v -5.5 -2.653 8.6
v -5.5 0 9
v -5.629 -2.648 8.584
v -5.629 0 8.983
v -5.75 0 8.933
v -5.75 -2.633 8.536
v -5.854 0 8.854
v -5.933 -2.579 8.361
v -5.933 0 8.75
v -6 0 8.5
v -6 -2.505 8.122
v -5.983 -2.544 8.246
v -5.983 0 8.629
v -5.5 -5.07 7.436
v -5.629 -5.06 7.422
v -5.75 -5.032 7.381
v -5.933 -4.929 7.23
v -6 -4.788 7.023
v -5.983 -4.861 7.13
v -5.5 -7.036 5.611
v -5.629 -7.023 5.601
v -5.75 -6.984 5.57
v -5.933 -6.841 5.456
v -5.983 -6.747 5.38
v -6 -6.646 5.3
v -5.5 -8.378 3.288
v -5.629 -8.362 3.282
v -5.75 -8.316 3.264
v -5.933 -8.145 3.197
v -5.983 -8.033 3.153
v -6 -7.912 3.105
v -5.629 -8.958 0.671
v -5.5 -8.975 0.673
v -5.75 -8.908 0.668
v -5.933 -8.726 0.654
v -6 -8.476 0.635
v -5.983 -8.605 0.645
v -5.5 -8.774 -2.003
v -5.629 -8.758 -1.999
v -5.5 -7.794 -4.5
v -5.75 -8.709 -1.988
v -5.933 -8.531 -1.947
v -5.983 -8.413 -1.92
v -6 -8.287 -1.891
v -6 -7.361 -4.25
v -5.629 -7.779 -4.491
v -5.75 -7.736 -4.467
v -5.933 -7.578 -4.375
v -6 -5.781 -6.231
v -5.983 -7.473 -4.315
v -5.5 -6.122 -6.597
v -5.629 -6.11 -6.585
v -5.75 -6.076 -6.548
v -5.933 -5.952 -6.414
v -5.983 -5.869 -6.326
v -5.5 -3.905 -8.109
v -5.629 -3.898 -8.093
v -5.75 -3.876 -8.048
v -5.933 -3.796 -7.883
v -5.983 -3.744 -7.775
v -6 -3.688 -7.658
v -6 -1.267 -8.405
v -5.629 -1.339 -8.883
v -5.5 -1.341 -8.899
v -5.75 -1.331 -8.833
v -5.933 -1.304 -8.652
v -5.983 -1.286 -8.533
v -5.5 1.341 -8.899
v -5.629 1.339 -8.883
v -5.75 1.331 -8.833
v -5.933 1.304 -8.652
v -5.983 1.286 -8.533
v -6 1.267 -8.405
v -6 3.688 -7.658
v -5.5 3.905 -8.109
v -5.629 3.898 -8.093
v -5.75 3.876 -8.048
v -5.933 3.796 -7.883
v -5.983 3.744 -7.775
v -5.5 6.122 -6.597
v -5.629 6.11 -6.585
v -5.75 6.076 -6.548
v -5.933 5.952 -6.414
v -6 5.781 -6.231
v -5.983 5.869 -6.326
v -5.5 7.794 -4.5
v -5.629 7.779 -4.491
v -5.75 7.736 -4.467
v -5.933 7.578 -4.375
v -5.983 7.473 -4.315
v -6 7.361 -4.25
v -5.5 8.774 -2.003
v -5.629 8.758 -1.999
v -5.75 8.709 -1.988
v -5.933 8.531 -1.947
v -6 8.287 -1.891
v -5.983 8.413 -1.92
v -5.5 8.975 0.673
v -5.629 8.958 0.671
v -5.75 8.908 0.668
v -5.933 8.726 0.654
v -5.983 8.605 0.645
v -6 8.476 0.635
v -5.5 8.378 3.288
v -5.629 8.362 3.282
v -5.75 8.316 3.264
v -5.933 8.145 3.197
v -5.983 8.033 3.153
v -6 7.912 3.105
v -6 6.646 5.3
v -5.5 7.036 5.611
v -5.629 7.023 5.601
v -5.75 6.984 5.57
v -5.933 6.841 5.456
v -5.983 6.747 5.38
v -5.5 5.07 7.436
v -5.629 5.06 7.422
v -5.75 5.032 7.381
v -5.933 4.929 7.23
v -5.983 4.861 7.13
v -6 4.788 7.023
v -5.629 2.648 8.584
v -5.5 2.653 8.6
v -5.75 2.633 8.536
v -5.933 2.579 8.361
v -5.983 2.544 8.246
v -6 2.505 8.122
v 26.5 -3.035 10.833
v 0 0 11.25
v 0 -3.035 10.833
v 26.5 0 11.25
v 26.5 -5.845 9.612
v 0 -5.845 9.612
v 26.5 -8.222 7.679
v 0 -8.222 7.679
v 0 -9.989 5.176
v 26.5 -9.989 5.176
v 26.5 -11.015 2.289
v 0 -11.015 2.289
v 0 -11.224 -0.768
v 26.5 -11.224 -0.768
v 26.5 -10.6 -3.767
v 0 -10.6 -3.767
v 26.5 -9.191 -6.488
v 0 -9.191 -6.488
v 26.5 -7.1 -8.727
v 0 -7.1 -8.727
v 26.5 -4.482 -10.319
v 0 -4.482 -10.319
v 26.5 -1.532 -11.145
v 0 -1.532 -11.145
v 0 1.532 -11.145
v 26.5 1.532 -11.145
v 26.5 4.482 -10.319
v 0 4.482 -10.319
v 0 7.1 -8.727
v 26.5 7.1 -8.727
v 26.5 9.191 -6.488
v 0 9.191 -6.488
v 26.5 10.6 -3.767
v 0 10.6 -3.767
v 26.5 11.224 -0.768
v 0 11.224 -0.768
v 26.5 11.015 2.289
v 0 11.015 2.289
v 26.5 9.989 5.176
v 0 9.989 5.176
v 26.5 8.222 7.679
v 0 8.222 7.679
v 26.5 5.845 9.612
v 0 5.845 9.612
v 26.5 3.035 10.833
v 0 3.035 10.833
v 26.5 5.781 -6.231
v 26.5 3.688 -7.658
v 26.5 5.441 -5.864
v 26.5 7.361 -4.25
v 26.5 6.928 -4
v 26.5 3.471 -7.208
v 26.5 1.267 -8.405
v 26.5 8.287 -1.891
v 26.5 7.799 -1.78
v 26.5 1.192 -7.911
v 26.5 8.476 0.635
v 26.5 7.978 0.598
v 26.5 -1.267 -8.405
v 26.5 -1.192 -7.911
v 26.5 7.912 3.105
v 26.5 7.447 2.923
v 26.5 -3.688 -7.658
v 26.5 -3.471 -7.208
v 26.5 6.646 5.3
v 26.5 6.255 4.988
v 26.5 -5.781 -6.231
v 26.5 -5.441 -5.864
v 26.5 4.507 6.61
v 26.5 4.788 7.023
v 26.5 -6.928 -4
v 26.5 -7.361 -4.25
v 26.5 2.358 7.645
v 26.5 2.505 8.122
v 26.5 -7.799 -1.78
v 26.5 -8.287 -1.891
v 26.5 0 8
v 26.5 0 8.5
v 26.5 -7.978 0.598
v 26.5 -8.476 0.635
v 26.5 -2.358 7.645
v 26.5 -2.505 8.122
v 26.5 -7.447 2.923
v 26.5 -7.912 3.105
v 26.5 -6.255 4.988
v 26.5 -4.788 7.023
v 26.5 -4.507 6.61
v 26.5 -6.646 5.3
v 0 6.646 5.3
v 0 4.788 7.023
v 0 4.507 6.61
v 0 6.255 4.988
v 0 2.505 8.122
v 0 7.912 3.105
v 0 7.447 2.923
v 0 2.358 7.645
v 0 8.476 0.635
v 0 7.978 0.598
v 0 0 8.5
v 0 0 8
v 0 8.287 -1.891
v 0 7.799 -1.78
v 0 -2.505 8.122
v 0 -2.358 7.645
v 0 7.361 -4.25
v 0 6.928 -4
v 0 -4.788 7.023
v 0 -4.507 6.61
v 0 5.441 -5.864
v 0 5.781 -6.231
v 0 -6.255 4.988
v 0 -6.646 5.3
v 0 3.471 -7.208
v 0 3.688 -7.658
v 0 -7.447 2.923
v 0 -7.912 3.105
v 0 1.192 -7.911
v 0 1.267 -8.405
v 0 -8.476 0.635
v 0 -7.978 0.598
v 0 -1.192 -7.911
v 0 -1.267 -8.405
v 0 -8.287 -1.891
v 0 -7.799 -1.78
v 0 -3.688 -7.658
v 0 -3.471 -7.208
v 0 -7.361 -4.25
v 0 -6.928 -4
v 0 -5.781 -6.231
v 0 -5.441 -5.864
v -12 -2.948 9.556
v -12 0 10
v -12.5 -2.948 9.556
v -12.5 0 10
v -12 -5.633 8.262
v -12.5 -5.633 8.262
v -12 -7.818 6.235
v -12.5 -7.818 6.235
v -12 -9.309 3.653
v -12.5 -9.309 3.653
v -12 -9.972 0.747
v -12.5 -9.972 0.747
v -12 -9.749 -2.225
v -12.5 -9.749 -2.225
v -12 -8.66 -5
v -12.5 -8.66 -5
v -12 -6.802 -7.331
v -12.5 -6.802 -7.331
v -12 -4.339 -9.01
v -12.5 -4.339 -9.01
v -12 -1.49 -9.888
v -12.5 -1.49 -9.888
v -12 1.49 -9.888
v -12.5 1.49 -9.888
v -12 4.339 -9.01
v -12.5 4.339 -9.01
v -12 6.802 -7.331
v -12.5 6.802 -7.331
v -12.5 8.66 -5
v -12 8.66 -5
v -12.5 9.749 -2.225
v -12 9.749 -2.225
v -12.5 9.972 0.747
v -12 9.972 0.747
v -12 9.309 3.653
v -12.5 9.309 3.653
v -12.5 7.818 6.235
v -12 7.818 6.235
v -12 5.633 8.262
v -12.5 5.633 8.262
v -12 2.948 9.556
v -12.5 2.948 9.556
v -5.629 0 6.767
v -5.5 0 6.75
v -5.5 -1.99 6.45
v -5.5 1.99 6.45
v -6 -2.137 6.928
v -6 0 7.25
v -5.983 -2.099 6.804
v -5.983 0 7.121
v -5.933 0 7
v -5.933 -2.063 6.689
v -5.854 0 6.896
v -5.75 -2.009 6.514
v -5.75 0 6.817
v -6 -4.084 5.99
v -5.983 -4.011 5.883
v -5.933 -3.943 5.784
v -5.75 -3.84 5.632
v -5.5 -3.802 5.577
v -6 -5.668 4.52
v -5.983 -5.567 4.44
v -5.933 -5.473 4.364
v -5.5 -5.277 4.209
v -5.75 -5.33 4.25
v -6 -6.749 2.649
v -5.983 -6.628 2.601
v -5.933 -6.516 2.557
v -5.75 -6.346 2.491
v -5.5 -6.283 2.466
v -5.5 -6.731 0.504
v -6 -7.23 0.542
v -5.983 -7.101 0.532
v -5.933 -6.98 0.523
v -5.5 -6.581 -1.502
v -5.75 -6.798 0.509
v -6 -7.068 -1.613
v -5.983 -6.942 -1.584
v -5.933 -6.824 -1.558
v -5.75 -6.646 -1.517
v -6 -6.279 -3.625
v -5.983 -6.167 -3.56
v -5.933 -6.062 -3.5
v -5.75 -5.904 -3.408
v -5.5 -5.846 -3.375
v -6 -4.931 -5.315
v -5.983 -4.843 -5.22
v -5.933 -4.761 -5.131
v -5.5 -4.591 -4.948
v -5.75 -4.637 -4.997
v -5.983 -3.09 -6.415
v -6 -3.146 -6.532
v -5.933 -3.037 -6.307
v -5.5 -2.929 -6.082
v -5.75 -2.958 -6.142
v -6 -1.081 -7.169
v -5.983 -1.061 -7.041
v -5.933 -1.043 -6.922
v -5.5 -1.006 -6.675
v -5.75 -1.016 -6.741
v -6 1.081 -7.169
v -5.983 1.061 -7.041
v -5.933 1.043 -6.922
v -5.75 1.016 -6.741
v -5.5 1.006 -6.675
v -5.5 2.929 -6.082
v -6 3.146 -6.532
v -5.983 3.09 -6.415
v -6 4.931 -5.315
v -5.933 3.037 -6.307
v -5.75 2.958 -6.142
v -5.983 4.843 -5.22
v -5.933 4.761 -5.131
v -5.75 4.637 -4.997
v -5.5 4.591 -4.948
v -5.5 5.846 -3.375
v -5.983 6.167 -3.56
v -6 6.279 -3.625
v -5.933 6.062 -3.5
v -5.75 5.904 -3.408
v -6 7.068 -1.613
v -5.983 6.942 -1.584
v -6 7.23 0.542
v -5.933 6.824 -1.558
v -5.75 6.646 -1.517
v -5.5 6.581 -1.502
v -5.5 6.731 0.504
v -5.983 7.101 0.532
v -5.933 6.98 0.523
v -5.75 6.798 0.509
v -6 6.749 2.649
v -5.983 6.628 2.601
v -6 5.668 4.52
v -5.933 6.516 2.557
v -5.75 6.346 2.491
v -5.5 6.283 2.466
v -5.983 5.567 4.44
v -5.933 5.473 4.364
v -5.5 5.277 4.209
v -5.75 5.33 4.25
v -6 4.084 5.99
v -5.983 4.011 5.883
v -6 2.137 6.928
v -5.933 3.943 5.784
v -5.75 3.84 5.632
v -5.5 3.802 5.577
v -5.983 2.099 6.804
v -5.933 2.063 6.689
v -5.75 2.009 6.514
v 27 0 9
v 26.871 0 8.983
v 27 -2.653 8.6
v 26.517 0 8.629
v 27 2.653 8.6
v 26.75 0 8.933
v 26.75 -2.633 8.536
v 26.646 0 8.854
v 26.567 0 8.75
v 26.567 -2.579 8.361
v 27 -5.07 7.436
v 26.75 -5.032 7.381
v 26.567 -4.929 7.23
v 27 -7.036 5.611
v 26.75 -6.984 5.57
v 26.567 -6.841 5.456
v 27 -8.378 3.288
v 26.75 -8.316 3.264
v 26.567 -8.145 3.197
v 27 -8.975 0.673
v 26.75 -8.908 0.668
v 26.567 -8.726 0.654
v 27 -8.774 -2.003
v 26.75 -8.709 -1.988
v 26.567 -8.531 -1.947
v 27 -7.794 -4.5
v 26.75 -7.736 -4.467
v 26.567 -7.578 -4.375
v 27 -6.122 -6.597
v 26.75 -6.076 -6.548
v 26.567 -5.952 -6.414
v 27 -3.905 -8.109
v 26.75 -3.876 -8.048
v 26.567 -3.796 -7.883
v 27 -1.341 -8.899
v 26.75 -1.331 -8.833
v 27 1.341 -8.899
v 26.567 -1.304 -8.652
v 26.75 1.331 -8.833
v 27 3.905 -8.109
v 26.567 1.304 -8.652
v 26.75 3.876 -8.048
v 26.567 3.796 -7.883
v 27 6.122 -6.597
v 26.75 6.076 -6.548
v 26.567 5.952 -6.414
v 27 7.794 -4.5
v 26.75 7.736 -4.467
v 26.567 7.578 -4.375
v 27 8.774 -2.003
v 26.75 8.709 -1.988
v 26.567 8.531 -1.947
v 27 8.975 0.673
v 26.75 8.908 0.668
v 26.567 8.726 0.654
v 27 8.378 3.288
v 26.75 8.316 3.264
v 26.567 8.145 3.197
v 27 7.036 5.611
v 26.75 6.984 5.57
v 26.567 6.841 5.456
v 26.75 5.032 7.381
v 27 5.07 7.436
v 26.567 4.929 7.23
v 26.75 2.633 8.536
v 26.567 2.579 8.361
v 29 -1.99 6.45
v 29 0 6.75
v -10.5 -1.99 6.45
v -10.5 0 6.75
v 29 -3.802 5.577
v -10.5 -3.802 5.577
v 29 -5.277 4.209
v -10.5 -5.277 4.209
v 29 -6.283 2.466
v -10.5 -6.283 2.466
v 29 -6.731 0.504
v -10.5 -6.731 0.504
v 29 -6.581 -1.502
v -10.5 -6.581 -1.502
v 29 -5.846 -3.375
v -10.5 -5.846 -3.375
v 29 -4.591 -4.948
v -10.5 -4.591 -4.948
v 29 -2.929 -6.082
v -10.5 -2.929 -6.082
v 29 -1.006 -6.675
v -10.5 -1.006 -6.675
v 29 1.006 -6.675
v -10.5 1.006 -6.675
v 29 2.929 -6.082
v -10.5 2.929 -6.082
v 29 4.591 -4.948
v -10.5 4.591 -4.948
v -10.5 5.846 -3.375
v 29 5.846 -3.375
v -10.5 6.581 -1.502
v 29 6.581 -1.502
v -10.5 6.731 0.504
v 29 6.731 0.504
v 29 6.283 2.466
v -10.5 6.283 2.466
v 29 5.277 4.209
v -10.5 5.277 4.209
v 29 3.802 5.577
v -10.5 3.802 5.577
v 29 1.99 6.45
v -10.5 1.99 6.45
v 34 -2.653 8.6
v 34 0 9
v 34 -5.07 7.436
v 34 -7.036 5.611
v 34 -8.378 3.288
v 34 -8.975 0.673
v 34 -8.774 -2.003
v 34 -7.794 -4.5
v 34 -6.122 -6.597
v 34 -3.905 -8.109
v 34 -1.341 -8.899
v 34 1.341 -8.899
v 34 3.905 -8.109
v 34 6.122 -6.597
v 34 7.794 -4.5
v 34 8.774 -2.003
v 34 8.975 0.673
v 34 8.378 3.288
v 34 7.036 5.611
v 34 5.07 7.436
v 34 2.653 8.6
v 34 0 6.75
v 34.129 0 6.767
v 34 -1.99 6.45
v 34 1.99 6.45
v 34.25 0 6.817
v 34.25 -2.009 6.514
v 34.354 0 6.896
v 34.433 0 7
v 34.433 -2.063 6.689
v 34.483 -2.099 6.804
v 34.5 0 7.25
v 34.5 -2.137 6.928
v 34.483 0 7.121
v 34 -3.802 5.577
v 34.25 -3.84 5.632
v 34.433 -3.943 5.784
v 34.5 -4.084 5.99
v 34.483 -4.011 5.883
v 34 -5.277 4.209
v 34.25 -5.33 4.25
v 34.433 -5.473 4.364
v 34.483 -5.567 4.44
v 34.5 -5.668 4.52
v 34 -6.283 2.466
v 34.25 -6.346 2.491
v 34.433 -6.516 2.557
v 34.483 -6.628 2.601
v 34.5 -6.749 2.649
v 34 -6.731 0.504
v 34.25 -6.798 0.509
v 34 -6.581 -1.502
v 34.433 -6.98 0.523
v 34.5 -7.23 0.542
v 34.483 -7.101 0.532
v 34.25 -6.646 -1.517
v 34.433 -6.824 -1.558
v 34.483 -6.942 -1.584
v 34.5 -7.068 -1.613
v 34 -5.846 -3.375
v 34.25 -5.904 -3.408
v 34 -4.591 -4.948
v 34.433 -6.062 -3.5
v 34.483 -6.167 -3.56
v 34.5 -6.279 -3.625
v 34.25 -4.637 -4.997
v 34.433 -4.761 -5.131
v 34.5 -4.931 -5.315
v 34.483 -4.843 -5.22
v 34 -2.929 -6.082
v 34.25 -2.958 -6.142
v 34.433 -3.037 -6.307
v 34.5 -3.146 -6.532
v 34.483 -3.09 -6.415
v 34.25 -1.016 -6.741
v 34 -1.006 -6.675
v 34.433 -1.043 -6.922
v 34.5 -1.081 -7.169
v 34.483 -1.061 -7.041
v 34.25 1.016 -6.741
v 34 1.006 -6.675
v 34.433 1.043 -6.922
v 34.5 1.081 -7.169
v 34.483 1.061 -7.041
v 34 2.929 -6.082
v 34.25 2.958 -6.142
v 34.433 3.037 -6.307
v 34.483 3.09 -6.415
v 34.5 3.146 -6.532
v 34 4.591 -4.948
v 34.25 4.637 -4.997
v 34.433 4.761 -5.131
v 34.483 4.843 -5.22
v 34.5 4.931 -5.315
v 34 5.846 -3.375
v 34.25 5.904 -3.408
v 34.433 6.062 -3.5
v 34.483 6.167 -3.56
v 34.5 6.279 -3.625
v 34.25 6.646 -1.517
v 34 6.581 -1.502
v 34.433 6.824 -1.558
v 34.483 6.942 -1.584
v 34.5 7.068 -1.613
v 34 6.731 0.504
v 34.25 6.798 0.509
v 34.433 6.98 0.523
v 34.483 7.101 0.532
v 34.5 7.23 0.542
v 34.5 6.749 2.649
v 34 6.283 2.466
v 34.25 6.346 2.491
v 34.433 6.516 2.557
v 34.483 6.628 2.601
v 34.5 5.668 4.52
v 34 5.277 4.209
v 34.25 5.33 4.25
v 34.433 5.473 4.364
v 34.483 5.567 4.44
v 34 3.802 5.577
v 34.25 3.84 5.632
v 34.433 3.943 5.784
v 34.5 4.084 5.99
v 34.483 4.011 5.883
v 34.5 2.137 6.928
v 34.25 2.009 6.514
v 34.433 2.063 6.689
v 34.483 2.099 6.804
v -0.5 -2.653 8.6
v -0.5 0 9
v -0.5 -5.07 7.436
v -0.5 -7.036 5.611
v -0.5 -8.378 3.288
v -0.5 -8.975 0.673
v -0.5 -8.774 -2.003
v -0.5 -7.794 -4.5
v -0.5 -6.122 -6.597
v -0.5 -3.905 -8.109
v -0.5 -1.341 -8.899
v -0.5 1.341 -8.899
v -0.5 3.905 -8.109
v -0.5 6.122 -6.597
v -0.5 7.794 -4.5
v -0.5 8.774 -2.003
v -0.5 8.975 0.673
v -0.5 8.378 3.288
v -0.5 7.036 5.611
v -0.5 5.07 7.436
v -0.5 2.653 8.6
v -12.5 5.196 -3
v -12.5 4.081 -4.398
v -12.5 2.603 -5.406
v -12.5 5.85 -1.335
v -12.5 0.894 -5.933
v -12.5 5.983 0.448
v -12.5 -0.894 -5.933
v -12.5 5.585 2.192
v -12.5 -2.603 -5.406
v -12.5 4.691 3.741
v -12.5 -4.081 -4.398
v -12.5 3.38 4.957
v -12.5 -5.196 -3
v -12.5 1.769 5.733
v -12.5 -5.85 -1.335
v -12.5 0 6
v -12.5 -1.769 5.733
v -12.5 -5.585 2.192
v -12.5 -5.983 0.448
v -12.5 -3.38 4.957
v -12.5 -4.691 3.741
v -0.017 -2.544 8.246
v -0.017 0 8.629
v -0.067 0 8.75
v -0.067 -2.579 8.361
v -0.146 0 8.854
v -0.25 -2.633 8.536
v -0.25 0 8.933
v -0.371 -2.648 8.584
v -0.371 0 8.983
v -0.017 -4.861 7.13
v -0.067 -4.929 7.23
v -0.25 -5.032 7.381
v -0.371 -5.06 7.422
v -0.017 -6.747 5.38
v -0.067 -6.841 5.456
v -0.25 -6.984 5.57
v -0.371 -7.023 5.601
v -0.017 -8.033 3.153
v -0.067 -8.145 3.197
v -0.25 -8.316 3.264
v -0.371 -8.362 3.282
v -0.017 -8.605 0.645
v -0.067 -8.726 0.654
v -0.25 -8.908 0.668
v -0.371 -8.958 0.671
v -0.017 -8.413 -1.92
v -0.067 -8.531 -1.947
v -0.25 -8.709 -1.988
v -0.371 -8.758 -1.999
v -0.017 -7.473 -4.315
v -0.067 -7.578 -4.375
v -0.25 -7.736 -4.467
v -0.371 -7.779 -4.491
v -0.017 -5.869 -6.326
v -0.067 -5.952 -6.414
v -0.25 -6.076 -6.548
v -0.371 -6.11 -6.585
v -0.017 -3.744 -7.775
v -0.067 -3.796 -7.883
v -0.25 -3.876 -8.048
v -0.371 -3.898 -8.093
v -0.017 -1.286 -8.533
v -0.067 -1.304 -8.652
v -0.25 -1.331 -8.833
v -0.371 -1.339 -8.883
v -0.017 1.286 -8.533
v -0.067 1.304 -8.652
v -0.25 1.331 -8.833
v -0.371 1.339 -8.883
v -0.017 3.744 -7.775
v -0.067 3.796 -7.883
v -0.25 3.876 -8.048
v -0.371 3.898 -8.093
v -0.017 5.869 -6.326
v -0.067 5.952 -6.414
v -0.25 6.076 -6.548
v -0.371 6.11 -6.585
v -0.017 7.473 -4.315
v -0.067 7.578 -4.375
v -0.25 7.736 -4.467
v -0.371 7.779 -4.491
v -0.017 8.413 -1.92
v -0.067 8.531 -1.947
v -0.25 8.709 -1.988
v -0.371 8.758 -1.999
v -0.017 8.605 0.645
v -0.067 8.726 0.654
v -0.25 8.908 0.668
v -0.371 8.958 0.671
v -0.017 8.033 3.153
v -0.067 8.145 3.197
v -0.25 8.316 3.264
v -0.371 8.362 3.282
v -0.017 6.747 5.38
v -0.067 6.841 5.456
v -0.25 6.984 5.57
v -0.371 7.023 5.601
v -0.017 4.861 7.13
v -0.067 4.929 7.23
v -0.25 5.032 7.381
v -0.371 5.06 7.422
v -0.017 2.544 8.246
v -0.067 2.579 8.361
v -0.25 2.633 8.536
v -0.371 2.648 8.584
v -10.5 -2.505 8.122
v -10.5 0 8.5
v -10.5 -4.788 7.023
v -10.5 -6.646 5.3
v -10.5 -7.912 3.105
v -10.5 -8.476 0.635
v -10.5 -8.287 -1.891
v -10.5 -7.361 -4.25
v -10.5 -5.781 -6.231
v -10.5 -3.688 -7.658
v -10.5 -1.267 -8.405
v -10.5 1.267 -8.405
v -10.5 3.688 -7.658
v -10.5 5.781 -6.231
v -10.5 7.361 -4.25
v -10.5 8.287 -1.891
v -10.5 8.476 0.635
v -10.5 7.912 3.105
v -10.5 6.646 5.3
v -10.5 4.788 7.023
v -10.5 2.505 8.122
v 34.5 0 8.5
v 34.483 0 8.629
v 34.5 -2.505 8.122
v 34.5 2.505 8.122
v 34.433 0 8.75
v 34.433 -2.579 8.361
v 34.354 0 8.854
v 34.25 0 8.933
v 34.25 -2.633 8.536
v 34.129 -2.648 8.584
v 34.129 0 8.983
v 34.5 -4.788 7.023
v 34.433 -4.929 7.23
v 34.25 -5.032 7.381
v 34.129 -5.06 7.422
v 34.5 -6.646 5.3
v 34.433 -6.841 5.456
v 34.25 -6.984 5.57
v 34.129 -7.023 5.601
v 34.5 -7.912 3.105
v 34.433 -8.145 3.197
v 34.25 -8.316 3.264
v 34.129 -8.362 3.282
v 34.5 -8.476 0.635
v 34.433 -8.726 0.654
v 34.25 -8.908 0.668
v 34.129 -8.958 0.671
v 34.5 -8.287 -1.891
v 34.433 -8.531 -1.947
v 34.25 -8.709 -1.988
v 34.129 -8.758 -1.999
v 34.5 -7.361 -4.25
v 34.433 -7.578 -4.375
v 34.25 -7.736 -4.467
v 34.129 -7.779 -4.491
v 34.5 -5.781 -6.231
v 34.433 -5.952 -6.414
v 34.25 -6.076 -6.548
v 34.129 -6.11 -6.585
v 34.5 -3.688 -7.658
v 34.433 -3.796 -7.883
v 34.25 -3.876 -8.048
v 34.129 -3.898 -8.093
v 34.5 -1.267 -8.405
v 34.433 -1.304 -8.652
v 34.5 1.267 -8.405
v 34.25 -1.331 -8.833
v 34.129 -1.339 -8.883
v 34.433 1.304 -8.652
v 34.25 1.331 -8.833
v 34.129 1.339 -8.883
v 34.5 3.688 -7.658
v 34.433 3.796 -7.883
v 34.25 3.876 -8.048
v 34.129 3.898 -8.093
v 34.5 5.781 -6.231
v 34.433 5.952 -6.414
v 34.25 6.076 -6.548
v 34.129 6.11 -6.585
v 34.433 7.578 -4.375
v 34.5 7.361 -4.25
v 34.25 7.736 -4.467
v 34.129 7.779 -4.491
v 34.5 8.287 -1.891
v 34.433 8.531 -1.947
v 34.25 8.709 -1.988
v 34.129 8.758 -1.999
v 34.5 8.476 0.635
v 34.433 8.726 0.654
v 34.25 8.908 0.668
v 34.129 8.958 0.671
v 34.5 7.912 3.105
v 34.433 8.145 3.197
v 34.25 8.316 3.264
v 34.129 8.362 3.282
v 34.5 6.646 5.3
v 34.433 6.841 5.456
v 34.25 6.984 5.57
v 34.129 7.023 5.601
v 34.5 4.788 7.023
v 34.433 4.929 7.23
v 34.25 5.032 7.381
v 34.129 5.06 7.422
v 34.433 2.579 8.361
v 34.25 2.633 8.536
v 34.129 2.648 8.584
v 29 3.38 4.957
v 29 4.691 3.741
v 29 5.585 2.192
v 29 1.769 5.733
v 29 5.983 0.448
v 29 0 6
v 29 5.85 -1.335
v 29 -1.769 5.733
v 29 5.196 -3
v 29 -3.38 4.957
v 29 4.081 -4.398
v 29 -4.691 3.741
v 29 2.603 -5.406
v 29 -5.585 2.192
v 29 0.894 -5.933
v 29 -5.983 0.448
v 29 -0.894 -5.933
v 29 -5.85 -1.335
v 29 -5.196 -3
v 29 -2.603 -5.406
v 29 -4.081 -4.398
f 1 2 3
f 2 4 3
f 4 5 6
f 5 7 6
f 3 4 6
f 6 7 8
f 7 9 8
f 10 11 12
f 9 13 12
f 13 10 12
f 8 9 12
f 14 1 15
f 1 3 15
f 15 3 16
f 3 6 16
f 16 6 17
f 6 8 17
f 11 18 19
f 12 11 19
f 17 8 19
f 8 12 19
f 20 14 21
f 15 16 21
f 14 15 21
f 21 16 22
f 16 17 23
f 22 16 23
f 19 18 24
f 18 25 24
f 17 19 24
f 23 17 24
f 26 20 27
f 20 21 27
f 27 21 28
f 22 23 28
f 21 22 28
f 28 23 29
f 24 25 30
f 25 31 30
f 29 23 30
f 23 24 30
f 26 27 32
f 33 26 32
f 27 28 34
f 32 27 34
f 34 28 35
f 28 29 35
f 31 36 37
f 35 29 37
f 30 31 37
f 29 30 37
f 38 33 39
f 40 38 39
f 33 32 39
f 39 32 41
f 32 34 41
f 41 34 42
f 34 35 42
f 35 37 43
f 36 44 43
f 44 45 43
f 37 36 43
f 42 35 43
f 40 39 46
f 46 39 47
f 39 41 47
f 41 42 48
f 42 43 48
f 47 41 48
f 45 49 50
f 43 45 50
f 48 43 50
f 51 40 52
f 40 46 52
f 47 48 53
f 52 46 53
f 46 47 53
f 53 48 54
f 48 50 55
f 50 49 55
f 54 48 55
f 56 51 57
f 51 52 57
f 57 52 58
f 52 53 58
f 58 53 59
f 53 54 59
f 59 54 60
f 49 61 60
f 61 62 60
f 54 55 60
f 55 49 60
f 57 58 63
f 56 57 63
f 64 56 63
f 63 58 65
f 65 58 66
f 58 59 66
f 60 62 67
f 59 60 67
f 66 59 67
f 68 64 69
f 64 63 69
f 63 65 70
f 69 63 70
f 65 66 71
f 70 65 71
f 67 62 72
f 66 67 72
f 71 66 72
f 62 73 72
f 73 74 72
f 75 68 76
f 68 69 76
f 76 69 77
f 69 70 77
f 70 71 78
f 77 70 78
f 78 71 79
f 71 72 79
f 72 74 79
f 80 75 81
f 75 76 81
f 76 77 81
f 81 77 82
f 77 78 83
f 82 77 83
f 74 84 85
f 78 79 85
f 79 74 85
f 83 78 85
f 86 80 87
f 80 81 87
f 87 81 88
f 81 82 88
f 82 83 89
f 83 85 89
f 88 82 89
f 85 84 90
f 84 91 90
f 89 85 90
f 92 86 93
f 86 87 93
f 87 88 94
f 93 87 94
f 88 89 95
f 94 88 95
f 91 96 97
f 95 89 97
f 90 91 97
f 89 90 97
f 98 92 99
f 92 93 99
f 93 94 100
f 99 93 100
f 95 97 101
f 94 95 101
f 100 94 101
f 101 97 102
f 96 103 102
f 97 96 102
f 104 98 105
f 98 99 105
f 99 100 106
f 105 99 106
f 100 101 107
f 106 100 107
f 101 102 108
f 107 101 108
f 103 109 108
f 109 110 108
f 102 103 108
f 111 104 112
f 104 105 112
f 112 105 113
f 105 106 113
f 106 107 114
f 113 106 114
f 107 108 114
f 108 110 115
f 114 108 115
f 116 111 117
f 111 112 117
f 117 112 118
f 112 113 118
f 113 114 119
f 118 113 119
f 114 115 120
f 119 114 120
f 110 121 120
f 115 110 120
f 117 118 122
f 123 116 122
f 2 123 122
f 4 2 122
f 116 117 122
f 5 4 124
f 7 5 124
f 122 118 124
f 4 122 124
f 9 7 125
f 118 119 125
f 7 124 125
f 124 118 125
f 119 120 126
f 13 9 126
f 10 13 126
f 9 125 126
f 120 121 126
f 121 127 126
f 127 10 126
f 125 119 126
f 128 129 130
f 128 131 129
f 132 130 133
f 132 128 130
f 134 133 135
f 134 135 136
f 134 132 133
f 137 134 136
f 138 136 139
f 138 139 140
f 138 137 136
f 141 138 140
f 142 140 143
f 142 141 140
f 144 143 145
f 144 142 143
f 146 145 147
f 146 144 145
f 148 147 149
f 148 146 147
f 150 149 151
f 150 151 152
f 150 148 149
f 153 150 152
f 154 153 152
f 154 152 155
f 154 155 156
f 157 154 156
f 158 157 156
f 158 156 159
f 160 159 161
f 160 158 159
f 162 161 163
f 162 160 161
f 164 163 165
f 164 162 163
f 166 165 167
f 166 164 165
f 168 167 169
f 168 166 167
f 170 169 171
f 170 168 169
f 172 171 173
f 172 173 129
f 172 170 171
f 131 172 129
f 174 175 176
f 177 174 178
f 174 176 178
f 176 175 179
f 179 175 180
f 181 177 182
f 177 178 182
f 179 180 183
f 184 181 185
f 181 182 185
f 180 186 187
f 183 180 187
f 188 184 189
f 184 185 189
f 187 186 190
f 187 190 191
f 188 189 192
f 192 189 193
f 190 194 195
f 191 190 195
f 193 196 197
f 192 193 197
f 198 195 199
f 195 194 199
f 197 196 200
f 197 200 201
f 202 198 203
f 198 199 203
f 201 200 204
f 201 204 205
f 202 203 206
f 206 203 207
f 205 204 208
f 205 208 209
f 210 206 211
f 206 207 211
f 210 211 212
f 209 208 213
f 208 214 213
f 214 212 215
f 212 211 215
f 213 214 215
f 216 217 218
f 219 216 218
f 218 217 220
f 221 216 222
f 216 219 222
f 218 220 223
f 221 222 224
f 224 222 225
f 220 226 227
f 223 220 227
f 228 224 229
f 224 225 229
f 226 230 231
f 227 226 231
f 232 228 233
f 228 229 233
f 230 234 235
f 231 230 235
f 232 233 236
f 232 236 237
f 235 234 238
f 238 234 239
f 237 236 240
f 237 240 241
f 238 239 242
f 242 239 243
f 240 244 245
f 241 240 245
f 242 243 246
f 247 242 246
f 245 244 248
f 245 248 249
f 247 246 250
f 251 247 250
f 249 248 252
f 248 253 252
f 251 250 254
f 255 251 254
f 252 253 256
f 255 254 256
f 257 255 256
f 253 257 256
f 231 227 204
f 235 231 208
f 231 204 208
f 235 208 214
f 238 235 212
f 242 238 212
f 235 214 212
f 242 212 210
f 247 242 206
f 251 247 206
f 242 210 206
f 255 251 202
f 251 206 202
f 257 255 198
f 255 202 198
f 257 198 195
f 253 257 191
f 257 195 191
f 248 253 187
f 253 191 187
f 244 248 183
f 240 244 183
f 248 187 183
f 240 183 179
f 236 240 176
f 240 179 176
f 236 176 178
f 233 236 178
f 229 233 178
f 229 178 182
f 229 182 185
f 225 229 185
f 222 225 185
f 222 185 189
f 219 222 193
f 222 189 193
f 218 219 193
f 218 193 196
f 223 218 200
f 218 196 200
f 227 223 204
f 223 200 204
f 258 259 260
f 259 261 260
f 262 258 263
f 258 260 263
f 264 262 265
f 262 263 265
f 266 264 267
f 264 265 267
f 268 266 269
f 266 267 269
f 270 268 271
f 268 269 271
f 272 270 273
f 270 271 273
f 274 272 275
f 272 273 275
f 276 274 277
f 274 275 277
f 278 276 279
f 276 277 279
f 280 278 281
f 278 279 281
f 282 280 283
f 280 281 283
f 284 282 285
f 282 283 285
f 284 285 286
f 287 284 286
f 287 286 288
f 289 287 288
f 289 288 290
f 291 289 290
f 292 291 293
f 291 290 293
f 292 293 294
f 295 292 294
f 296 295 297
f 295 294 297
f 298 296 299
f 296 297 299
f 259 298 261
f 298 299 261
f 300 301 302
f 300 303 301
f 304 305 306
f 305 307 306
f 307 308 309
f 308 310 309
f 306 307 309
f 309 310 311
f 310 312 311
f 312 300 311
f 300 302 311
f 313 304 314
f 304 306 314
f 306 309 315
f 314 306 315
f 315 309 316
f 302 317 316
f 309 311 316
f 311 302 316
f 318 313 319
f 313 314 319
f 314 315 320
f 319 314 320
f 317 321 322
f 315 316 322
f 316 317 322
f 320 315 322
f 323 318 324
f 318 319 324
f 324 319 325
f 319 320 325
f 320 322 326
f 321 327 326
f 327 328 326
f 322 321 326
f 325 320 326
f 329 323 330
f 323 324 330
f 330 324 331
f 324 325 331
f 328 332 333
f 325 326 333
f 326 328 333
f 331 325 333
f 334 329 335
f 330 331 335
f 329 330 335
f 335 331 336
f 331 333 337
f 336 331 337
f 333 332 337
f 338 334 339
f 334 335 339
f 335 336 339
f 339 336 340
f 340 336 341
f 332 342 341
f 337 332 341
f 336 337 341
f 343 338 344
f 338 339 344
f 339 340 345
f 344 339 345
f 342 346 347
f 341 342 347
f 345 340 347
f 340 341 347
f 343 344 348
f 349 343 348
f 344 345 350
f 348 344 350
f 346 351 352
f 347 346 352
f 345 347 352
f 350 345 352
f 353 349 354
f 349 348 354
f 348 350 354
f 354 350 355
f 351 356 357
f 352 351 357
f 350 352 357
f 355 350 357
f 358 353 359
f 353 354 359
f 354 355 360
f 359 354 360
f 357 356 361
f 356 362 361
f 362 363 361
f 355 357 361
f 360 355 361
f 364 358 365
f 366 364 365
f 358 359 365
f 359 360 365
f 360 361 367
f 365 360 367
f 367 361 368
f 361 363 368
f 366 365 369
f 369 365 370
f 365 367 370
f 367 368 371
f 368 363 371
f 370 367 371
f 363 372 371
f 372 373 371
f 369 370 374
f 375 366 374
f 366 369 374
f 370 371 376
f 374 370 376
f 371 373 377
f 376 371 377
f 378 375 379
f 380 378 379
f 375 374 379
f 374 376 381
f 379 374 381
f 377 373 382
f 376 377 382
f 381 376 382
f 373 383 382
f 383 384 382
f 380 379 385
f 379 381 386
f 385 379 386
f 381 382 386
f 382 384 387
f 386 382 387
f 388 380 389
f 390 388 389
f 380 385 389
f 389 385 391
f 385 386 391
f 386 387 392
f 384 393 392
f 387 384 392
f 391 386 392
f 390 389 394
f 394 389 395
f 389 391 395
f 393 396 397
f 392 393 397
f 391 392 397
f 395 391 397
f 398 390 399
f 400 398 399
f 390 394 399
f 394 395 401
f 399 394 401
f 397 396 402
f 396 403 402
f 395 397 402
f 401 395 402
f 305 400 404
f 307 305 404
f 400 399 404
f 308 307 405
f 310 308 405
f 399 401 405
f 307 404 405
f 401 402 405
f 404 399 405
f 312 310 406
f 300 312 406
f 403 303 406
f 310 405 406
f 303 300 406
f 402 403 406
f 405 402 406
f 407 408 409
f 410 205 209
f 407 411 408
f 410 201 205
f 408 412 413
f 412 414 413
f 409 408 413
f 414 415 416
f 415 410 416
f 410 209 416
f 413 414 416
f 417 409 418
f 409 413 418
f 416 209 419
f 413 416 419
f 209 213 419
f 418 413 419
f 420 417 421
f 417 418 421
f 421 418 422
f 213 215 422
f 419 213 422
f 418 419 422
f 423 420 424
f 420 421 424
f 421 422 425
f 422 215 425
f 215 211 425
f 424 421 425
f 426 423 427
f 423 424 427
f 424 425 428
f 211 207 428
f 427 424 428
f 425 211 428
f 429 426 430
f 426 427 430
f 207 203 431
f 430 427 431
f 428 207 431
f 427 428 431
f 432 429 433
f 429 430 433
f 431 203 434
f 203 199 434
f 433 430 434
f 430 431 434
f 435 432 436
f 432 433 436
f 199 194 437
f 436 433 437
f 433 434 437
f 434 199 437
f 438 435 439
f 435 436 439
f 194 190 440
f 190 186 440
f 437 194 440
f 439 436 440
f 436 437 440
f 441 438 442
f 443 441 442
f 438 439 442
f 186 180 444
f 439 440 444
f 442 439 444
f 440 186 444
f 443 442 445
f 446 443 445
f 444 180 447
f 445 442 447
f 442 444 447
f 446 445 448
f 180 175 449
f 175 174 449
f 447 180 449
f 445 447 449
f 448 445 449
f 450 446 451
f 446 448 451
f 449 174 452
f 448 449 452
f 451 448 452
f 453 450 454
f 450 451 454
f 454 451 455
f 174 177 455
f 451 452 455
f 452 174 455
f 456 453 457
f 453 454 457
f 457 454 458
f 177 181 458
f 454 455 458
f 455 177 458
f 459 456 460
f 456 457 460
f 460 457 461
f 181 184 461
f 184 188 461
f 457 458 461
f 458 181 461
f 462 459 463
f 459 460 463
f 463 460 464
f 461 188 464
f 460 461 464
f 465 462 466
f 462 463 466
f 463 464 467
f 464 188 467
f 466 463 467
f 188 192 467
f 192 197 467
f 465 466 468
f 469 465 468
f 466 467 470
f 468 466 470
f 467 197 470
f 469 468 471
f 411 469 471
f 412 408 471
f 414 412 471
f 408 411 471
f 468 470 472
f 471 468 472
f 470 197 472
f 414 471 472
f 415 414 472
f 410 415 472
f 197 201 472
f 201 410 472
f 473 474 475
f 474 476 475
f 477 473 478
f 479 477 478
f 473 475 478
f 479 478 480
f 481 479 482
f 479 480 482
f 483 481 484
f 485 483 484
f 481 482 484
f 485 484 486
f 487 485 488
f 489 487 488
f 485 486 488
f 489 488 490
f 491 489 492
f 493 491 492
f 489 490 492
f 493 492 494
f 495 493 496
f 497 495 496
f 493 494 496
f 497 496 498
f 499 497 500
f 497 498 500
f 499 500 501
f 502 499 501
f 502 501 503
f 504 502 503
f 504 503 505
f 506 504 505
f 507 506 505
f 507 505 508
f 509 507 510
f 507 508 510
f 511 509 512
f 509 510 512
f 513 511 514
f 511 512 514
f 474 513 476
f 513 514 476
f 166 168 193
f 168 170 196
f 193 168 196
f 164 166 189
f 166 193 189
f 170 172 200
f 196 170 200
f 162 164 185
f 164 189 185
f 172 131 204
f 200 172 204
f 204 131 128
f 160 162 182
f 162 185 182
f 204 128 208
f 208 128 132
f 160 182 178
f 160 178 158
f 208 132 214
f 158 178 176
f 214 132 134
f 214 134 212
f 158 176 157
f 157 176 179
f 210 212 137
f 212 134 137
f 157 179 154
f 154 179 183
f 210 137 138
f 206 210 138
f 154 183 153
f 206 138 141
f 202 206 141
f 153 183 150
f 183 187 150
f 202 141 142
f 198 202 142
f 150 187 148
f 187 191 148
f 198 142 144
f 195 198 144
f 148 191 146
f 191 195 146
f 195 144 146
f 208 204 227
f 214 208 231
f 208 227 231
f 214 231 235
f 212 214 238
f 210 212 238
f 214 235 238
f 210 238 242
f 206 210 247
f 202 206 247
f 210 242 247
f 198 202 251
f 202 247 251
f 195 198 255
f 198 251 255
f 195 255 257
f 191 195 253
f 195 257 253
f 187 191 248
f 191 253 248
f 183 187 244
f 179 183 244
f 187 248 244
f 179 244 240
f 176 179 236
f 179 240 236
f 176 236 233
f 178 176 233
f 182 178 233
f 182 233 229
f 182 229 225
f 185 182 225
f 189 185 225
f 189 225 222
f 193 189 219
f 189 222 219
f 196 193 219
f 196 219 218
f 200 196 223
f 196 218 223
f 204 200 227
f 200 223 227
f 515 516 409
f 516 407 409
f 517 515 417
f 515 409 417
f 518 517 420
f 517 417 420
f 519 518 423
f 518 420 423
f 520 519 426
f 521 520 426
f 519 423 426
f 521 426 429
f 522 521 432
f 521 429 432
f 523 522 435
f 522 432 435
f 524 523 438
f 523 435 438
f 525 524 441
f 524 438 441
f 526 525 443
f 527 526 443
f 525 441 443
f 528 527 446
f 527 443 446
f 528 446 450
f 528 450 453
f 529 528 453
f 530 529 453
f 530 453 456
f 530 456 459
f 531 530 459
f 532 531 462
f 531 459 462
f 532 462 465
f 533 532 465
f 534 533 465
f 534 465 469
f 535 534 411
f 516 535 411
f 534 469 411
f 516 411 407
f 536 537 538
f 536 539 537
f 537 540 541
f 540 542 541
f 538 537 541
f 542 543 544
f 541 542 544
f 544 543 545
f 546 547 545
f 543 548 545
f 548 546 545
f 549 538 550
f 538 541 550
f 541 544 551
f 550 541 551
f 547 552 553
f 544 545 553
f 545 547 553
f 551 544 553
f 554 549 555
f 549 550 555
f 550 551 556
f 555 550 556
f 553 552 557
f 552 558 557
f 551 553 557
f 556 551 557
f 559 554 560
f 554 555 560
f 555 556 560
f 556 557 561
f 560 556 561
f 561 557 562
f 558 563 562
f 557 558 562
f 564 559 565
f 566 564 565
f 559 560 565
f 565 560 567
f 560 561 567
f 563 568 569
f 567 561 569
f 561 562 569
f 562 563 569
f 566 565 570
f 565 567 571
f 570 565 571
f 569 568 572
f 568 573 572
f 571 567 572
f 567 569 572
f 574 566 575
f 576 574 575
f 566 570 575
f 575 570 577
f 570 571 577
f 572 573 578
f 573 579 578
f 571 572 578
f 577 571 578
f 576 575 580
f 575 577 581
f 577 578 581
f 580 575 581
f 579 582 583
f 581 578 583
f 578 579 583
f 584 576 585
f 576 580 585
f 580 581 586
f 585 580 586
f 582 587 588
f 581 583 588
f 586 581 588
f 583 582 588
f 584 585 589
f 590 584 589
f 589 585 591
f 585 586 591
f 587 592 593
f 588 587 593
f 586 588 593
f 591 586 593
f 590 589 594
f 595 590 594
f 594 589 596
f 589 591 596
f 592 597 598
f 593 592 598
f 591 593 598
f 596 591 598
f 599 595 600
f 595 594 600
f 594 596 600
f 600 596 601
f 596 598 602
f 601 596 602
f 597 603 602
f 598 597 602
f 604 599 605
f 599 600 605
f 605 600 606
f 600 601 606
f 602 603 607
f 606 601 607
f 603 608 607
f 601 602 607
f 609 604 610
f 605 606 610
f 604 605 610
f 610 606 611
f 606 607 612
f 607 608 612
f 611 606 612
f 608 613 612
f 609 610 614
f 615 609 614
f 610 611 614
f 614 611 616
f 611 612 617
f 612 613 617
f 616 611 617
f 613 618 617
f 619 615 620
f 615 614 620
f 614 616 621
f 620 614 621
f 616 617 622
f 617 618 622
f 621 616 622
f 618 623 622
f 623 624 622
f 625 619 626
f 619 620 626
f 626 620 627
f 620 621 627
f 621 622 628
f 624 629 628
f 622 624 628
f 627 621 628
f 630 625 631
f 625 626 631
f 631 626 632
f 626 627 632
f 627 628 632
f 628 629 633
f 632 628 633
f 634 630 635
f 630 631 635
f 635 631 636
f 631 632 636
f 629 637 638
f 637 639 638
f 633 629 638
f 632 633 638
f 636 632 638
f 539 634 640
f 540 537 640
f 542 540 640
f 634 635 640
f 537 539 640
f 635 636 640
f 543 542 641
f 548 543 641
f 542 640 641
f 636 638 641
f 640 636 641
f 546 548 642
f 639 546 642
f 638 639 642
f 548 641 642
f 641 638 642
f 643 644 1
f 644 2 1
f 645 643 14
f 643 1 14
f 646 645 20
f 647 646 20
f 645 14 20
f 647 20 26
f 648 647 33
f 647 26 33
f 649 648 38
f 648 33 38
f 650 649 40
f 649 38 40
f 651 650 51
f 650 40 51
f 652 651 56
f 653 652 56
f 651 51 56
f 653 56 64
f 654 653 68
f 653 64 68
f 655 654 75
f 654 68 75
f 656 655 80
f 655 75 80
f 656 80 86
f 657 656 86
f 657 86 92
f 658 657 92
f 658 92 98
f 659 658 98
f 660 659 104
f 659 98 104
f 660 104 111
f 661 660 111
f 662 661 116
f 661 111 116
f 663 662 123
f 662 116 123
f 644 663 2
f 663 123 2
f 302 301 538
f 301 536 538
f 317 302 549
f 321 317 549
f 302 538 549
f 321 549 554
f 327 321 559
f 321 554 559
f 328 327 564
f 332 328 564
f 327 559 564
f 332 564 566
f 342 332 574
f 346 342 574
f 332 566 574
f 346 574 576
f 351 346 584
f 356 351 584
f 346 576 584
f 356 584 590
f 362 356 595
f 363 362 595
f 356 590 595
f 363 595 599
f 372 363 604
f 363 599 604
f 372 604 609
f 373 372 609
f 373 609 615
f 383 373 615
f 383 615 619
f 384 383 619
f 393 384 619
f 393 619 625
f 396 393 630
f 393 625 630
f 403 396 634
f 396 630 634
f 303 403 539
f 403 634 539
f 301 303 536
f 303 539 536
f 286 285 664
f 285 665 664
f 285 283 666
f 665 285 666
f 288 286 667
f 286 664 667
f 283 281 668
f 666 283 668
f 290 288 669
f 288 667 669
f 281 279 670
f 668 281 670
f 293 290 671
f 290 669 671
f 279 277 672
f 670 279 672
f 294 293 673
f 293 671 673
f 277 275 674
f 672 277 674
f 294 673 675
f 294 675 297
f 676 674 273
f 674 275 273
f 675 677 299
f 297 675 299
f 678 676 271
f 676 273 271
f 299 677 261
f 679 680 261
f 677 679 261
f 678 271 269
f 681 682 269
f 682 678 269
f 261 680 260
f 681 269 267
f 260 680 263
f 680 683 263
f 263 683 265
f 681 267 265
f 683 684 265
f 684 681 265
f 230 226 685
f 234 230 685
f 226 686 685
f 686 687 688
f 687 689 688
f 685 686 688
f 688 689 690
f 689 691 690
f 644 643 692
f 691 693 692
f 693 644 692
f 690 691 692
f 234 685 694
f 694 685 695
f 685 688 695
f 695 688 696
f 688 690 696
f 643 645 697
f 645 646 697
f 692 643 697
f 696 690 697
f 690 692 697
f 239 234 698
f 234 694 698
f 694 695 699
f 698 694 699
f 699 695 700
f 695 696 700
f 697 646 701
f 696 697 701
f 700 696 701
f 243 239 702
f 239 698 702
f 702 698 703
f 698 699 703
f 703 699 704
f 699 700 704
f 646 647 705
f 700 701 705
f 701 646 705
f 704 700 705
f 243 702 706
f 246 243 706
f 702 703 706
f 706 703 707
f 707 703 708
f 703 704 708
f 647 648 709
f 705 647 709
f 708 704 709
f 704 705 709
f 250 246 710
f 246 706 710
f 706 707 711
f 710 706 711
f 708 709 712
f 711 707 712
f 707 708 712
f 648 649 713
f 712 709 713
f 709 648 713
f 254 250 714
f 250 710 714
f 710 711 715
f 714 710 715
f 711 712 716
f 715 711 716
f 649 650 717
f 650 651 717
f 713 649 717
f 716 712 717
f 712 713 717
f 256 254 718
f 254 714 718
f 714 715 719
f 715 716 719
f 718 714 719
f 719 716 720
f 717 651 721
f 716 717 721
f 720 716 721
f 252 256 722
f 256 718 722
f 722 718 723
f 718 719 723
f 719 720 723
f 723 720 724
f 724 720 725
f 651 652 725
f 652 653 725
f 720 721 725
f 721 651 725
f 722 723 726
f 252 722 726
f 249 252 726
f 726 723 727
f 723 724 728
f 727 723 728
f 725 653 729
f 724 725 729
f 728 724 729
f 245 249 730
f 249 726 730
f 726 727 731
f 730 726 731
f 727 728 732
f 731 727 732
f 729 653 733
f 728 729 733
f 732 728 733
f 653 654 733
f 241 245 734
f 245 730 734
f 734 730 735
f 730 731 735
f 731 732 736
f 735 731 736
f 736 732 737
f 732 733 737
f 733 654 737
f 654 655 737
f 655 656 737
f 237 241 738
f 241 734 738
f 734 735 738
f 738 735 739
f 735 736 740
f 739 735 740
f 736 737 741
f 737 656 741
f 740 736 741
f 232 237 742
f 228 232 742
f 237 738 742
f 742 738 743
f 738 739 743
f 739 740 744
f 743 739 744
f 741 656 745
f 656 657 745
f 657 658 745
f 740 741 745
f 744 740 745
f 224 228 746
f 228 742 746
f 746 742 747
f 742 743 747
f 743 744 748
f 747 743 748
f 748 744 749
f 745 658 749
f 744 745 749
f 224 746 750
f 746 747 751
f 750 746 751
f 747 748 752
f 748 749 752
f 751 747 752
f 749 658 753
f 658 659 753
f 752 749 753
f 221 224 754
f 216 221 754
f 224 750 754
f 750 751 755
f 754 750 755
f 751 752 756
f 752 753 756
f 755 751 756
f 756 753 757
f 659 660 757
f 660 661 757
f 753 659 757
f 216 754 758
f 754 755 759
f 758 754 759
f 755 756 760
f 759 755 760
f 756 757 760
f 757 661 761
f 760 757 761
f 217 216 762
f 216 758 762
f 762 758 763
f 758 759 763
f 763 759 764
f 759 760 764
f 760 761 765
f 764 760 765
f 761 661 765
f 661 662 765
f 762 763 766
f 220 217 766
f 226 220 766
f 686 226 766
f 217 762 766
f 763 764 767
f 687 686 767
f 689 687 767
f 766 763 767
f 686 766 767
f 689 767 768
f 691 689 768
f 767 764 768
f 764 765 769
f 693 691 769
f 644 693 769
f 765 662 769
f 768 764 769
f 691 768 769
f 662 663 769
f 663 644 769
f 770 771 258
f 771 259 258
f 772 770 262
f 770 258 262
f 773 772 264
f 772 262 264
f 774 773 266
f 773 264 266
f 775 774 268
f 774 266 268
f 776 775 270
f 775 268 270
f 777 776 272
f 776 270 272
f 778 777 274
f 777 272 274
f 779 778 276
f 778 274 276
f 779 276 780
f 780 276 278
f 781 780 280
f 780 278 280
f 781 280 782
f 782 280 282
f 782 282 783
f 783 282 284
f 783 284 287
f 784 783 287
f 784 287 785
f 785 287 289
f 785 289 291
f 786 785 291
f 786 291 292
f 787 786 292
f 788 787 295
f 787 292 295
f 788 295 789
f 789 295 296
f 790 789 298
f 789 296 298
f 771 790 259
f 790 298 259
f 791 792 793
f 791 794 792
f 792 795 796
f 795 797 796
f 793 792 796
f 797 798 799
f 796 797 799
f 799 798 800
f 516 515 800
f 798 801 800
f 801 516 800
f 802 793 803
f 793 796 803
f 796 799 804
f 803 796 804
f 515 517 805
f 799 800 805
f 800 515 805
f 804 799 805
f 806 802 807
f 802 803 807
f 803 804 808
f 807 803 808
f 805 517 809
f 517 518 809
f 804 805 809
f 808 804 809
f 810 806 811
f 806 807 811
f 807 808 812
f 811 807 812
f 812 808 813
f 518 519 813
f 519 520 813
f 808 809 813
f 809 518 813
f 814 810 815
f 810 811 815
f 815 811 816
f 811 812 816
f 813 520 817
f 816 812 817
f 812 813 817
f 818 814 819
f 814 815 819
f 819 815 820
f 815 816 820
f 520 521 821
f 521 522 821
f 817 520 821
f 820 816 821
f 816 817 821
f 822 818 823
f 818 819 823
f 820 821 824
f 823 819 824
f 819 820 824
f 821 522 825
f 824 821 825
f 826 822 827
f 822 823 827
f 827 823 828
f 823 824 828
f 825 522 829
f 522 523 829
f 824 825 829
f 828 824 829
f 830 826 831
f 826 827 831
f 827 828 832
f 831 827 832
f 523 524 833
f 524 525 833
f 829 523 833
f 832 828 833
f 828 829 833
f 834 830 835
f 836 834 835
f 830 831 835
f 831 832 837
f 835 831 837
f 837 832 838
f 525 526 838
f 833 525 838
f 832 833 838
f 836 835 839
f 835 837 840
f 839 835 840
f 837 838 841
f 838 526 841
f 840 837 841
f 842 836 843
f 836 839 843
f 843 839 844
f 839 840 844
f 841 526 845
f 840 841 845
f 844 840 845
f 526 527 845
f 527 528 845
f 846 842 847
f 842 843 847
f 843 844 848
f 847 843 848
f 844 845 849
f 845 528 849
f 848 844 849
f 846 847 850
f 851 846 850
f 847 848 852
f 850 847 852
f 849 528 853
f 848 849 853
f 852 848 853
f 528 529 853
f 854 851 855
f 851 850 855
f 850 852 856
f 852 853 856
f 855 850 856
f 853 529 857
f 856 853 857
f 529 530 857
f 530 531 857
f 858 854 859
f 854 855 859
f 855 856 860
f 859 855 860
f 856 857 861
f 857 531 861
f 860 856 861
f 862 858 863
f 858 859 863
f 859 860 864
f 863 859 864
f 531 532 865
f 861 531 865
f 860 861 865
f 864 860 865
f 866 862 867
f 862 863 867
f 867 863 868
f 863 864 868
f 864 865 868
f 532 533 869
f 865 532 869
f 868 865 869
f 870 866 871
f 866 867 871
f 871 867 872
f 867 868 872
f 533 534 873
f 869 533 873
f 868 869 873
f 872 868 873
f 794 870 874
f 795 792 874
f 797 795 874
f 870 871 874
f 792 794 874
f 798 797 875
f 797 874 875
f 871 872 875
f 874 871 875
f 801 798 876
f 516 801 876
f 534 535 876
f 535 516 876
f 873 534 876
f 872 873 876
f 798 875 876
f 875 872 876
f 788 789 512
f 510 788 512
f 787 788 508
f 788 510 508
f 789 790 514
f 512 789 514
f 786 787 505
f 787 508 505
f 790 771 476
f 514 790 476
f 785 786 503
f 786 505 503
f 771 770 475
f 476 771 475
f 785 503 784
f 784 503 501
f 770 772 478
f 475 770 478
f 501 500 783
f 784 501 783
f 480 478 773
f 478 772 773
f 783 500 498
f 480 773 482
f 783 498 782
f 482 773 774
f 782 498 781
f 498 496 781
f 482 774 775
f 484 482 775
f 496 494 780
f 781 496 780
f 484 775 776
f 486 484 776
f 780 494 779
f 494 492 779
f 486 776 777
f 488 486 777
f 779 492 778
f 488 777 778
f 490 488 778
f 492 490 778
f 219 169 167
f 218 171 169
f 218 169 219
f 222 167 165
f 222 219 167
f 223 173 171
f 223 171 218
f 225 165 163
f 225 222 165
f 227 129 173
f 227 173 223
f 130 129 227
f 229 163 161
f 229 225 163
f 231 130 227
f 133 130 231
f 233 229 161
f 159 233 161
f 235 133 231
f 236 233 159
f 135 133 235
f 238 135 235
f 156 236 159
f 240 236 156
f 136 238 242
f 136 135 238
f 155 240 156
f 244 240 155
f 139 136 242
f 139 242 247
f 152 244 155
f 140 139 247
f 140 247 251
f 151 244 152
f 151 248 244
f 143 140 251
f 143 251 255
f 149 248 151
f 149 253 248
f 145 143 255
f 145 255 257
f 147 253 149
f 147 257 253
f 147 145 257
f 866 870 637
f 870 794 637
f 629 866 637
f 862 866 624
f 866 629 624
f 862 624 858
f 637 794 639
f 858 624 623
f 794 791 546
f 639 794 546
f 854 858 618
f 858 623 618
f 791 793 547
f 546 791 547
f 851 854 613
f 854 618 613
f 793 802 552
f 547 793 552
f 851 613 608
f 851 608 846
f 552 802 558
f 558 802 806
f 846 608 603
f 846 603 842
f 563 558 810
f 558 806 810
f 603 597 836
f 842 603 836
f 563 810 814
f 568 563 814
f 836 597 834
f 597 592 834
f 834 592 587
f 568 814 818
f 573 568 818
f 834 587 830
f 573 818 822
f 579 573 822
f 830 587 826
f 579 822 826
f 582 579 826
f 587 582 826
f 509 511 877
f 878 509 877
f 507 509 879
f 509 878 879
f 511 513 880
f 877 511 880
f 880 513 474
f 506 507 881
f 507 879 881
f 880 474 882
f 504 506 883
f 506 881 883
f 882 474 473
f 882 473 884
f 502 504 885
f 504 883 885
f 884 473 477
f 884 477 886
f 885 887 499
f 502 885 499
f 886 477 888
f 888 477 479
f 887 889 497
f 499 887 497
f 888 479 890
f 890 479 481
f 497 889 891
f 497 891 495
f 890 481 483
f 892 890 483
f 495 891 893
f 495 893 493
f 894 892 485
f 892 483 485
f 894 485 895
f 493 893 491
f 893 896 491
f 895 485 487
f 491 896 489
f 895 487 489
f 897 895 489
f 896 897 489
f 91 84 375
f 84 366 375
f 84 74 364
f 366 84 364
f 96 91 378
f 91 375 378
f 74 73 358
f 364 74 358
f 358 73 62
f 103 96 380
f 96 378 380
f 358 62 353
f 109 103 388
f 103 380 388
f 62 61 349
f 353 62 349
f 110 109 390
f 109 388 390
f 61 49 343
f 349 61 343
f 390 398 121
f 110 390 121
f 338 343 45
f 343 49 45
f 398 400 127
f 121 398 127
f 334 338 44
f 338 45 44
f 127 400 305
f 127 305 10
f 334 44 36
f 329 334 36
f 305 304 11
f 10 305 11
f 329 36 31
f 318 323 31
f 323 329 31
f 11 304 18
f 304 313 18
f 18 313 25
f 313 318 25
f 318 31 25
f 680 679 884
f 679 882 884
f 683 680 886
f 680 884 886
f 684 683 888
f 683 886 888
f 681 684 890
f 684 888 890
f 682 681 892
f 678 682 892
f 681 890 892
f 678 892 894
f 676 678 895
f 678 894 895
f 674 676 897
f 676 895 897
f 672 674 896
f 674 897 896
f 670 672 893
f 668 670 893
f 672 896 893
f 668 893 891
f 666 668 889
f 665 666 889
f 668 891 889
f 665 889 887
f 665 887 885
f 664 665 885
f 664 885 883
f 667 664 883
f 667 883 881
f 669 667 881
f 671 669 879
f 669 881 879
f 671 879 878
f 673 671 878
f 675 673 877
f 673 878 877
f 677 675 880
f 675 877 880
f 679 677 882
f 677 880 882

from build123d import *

# Parameters (mm, degrees)
F0_W = 26.5
F0_H = 3.25


with BuildPart() as f1:
    # F0 (on Front) → F1 (revolve)
    with BuildSketch(Plane.XZ):
        with Locations((13.25, 9.625)):
            Rectangle(F0_W, F0_H)
    revolve(axis=Axis((14.8436599411, 0, 0), (1, 0, 0)))


with BuildPart() as f3:
    # F2 (on Front) → F3 (revolve)
    with BuildSketch(Plane.XZ):
        Polygon((29, 6.75), (-10.5, 6.75), (-10.5, 8.5), (-12, 10), (-12.5, 10), (-12.5, 6), (29, 6), align=None)
    revolve(axis=Axis((-5.3301202133, 0, 0), (1, 0, 0)))


with BuildPart() as f5:
    # F4 (on Front) → F5 (revolve)
    with BuildSketch(Plane.XZ):
        with BuildLine():
            Line((-0.5, 9), (-5.5, 9))
            ThreePointArc((-5.5, 9), (-5.8535533906, 8.8535533906), (-6, 8.5))
            Line((-6, 8.5), (-6, 7.25))
            ThreePointArc((-6, 7.25), (-5.8535533906, 6.8964466094), (-5.5, 6.75))
            Line((-5.5, 6.75), (26.5, 6.75))
            Line((26.5, 6.75), (34, 6.75))
            ThreePointArc((34, 6.75), (34.3535533906, 6.8964466094), (34.5, 7.25))
            Line((34.5, 7.25), (34.5, 8.5))
            ThreePointArc((34.5, 8.5), (34.3535533906, 8.8535533906), (34, 9))
            Line((34, 9), (27, 9))
            ThreePointArc((27, 9), (26.6464466094, 8.8535533906), (26.5, 8.5))
            Line((26.5, 8.5), (26.5, 8))
            Line((26.5, 8), (0, 8))
            Line((0, 8), (0, 8.5))
            ThreePointArc((0, 8.5), (-0.1464466094, 8.8535533906), (-0.5, 9))
        make_face()
    revolve(axis=Axis((-21.9604996964, 0, 0), (1, 0, 0)))


solid = Compound([f1.part, f3.part, f5.part])
